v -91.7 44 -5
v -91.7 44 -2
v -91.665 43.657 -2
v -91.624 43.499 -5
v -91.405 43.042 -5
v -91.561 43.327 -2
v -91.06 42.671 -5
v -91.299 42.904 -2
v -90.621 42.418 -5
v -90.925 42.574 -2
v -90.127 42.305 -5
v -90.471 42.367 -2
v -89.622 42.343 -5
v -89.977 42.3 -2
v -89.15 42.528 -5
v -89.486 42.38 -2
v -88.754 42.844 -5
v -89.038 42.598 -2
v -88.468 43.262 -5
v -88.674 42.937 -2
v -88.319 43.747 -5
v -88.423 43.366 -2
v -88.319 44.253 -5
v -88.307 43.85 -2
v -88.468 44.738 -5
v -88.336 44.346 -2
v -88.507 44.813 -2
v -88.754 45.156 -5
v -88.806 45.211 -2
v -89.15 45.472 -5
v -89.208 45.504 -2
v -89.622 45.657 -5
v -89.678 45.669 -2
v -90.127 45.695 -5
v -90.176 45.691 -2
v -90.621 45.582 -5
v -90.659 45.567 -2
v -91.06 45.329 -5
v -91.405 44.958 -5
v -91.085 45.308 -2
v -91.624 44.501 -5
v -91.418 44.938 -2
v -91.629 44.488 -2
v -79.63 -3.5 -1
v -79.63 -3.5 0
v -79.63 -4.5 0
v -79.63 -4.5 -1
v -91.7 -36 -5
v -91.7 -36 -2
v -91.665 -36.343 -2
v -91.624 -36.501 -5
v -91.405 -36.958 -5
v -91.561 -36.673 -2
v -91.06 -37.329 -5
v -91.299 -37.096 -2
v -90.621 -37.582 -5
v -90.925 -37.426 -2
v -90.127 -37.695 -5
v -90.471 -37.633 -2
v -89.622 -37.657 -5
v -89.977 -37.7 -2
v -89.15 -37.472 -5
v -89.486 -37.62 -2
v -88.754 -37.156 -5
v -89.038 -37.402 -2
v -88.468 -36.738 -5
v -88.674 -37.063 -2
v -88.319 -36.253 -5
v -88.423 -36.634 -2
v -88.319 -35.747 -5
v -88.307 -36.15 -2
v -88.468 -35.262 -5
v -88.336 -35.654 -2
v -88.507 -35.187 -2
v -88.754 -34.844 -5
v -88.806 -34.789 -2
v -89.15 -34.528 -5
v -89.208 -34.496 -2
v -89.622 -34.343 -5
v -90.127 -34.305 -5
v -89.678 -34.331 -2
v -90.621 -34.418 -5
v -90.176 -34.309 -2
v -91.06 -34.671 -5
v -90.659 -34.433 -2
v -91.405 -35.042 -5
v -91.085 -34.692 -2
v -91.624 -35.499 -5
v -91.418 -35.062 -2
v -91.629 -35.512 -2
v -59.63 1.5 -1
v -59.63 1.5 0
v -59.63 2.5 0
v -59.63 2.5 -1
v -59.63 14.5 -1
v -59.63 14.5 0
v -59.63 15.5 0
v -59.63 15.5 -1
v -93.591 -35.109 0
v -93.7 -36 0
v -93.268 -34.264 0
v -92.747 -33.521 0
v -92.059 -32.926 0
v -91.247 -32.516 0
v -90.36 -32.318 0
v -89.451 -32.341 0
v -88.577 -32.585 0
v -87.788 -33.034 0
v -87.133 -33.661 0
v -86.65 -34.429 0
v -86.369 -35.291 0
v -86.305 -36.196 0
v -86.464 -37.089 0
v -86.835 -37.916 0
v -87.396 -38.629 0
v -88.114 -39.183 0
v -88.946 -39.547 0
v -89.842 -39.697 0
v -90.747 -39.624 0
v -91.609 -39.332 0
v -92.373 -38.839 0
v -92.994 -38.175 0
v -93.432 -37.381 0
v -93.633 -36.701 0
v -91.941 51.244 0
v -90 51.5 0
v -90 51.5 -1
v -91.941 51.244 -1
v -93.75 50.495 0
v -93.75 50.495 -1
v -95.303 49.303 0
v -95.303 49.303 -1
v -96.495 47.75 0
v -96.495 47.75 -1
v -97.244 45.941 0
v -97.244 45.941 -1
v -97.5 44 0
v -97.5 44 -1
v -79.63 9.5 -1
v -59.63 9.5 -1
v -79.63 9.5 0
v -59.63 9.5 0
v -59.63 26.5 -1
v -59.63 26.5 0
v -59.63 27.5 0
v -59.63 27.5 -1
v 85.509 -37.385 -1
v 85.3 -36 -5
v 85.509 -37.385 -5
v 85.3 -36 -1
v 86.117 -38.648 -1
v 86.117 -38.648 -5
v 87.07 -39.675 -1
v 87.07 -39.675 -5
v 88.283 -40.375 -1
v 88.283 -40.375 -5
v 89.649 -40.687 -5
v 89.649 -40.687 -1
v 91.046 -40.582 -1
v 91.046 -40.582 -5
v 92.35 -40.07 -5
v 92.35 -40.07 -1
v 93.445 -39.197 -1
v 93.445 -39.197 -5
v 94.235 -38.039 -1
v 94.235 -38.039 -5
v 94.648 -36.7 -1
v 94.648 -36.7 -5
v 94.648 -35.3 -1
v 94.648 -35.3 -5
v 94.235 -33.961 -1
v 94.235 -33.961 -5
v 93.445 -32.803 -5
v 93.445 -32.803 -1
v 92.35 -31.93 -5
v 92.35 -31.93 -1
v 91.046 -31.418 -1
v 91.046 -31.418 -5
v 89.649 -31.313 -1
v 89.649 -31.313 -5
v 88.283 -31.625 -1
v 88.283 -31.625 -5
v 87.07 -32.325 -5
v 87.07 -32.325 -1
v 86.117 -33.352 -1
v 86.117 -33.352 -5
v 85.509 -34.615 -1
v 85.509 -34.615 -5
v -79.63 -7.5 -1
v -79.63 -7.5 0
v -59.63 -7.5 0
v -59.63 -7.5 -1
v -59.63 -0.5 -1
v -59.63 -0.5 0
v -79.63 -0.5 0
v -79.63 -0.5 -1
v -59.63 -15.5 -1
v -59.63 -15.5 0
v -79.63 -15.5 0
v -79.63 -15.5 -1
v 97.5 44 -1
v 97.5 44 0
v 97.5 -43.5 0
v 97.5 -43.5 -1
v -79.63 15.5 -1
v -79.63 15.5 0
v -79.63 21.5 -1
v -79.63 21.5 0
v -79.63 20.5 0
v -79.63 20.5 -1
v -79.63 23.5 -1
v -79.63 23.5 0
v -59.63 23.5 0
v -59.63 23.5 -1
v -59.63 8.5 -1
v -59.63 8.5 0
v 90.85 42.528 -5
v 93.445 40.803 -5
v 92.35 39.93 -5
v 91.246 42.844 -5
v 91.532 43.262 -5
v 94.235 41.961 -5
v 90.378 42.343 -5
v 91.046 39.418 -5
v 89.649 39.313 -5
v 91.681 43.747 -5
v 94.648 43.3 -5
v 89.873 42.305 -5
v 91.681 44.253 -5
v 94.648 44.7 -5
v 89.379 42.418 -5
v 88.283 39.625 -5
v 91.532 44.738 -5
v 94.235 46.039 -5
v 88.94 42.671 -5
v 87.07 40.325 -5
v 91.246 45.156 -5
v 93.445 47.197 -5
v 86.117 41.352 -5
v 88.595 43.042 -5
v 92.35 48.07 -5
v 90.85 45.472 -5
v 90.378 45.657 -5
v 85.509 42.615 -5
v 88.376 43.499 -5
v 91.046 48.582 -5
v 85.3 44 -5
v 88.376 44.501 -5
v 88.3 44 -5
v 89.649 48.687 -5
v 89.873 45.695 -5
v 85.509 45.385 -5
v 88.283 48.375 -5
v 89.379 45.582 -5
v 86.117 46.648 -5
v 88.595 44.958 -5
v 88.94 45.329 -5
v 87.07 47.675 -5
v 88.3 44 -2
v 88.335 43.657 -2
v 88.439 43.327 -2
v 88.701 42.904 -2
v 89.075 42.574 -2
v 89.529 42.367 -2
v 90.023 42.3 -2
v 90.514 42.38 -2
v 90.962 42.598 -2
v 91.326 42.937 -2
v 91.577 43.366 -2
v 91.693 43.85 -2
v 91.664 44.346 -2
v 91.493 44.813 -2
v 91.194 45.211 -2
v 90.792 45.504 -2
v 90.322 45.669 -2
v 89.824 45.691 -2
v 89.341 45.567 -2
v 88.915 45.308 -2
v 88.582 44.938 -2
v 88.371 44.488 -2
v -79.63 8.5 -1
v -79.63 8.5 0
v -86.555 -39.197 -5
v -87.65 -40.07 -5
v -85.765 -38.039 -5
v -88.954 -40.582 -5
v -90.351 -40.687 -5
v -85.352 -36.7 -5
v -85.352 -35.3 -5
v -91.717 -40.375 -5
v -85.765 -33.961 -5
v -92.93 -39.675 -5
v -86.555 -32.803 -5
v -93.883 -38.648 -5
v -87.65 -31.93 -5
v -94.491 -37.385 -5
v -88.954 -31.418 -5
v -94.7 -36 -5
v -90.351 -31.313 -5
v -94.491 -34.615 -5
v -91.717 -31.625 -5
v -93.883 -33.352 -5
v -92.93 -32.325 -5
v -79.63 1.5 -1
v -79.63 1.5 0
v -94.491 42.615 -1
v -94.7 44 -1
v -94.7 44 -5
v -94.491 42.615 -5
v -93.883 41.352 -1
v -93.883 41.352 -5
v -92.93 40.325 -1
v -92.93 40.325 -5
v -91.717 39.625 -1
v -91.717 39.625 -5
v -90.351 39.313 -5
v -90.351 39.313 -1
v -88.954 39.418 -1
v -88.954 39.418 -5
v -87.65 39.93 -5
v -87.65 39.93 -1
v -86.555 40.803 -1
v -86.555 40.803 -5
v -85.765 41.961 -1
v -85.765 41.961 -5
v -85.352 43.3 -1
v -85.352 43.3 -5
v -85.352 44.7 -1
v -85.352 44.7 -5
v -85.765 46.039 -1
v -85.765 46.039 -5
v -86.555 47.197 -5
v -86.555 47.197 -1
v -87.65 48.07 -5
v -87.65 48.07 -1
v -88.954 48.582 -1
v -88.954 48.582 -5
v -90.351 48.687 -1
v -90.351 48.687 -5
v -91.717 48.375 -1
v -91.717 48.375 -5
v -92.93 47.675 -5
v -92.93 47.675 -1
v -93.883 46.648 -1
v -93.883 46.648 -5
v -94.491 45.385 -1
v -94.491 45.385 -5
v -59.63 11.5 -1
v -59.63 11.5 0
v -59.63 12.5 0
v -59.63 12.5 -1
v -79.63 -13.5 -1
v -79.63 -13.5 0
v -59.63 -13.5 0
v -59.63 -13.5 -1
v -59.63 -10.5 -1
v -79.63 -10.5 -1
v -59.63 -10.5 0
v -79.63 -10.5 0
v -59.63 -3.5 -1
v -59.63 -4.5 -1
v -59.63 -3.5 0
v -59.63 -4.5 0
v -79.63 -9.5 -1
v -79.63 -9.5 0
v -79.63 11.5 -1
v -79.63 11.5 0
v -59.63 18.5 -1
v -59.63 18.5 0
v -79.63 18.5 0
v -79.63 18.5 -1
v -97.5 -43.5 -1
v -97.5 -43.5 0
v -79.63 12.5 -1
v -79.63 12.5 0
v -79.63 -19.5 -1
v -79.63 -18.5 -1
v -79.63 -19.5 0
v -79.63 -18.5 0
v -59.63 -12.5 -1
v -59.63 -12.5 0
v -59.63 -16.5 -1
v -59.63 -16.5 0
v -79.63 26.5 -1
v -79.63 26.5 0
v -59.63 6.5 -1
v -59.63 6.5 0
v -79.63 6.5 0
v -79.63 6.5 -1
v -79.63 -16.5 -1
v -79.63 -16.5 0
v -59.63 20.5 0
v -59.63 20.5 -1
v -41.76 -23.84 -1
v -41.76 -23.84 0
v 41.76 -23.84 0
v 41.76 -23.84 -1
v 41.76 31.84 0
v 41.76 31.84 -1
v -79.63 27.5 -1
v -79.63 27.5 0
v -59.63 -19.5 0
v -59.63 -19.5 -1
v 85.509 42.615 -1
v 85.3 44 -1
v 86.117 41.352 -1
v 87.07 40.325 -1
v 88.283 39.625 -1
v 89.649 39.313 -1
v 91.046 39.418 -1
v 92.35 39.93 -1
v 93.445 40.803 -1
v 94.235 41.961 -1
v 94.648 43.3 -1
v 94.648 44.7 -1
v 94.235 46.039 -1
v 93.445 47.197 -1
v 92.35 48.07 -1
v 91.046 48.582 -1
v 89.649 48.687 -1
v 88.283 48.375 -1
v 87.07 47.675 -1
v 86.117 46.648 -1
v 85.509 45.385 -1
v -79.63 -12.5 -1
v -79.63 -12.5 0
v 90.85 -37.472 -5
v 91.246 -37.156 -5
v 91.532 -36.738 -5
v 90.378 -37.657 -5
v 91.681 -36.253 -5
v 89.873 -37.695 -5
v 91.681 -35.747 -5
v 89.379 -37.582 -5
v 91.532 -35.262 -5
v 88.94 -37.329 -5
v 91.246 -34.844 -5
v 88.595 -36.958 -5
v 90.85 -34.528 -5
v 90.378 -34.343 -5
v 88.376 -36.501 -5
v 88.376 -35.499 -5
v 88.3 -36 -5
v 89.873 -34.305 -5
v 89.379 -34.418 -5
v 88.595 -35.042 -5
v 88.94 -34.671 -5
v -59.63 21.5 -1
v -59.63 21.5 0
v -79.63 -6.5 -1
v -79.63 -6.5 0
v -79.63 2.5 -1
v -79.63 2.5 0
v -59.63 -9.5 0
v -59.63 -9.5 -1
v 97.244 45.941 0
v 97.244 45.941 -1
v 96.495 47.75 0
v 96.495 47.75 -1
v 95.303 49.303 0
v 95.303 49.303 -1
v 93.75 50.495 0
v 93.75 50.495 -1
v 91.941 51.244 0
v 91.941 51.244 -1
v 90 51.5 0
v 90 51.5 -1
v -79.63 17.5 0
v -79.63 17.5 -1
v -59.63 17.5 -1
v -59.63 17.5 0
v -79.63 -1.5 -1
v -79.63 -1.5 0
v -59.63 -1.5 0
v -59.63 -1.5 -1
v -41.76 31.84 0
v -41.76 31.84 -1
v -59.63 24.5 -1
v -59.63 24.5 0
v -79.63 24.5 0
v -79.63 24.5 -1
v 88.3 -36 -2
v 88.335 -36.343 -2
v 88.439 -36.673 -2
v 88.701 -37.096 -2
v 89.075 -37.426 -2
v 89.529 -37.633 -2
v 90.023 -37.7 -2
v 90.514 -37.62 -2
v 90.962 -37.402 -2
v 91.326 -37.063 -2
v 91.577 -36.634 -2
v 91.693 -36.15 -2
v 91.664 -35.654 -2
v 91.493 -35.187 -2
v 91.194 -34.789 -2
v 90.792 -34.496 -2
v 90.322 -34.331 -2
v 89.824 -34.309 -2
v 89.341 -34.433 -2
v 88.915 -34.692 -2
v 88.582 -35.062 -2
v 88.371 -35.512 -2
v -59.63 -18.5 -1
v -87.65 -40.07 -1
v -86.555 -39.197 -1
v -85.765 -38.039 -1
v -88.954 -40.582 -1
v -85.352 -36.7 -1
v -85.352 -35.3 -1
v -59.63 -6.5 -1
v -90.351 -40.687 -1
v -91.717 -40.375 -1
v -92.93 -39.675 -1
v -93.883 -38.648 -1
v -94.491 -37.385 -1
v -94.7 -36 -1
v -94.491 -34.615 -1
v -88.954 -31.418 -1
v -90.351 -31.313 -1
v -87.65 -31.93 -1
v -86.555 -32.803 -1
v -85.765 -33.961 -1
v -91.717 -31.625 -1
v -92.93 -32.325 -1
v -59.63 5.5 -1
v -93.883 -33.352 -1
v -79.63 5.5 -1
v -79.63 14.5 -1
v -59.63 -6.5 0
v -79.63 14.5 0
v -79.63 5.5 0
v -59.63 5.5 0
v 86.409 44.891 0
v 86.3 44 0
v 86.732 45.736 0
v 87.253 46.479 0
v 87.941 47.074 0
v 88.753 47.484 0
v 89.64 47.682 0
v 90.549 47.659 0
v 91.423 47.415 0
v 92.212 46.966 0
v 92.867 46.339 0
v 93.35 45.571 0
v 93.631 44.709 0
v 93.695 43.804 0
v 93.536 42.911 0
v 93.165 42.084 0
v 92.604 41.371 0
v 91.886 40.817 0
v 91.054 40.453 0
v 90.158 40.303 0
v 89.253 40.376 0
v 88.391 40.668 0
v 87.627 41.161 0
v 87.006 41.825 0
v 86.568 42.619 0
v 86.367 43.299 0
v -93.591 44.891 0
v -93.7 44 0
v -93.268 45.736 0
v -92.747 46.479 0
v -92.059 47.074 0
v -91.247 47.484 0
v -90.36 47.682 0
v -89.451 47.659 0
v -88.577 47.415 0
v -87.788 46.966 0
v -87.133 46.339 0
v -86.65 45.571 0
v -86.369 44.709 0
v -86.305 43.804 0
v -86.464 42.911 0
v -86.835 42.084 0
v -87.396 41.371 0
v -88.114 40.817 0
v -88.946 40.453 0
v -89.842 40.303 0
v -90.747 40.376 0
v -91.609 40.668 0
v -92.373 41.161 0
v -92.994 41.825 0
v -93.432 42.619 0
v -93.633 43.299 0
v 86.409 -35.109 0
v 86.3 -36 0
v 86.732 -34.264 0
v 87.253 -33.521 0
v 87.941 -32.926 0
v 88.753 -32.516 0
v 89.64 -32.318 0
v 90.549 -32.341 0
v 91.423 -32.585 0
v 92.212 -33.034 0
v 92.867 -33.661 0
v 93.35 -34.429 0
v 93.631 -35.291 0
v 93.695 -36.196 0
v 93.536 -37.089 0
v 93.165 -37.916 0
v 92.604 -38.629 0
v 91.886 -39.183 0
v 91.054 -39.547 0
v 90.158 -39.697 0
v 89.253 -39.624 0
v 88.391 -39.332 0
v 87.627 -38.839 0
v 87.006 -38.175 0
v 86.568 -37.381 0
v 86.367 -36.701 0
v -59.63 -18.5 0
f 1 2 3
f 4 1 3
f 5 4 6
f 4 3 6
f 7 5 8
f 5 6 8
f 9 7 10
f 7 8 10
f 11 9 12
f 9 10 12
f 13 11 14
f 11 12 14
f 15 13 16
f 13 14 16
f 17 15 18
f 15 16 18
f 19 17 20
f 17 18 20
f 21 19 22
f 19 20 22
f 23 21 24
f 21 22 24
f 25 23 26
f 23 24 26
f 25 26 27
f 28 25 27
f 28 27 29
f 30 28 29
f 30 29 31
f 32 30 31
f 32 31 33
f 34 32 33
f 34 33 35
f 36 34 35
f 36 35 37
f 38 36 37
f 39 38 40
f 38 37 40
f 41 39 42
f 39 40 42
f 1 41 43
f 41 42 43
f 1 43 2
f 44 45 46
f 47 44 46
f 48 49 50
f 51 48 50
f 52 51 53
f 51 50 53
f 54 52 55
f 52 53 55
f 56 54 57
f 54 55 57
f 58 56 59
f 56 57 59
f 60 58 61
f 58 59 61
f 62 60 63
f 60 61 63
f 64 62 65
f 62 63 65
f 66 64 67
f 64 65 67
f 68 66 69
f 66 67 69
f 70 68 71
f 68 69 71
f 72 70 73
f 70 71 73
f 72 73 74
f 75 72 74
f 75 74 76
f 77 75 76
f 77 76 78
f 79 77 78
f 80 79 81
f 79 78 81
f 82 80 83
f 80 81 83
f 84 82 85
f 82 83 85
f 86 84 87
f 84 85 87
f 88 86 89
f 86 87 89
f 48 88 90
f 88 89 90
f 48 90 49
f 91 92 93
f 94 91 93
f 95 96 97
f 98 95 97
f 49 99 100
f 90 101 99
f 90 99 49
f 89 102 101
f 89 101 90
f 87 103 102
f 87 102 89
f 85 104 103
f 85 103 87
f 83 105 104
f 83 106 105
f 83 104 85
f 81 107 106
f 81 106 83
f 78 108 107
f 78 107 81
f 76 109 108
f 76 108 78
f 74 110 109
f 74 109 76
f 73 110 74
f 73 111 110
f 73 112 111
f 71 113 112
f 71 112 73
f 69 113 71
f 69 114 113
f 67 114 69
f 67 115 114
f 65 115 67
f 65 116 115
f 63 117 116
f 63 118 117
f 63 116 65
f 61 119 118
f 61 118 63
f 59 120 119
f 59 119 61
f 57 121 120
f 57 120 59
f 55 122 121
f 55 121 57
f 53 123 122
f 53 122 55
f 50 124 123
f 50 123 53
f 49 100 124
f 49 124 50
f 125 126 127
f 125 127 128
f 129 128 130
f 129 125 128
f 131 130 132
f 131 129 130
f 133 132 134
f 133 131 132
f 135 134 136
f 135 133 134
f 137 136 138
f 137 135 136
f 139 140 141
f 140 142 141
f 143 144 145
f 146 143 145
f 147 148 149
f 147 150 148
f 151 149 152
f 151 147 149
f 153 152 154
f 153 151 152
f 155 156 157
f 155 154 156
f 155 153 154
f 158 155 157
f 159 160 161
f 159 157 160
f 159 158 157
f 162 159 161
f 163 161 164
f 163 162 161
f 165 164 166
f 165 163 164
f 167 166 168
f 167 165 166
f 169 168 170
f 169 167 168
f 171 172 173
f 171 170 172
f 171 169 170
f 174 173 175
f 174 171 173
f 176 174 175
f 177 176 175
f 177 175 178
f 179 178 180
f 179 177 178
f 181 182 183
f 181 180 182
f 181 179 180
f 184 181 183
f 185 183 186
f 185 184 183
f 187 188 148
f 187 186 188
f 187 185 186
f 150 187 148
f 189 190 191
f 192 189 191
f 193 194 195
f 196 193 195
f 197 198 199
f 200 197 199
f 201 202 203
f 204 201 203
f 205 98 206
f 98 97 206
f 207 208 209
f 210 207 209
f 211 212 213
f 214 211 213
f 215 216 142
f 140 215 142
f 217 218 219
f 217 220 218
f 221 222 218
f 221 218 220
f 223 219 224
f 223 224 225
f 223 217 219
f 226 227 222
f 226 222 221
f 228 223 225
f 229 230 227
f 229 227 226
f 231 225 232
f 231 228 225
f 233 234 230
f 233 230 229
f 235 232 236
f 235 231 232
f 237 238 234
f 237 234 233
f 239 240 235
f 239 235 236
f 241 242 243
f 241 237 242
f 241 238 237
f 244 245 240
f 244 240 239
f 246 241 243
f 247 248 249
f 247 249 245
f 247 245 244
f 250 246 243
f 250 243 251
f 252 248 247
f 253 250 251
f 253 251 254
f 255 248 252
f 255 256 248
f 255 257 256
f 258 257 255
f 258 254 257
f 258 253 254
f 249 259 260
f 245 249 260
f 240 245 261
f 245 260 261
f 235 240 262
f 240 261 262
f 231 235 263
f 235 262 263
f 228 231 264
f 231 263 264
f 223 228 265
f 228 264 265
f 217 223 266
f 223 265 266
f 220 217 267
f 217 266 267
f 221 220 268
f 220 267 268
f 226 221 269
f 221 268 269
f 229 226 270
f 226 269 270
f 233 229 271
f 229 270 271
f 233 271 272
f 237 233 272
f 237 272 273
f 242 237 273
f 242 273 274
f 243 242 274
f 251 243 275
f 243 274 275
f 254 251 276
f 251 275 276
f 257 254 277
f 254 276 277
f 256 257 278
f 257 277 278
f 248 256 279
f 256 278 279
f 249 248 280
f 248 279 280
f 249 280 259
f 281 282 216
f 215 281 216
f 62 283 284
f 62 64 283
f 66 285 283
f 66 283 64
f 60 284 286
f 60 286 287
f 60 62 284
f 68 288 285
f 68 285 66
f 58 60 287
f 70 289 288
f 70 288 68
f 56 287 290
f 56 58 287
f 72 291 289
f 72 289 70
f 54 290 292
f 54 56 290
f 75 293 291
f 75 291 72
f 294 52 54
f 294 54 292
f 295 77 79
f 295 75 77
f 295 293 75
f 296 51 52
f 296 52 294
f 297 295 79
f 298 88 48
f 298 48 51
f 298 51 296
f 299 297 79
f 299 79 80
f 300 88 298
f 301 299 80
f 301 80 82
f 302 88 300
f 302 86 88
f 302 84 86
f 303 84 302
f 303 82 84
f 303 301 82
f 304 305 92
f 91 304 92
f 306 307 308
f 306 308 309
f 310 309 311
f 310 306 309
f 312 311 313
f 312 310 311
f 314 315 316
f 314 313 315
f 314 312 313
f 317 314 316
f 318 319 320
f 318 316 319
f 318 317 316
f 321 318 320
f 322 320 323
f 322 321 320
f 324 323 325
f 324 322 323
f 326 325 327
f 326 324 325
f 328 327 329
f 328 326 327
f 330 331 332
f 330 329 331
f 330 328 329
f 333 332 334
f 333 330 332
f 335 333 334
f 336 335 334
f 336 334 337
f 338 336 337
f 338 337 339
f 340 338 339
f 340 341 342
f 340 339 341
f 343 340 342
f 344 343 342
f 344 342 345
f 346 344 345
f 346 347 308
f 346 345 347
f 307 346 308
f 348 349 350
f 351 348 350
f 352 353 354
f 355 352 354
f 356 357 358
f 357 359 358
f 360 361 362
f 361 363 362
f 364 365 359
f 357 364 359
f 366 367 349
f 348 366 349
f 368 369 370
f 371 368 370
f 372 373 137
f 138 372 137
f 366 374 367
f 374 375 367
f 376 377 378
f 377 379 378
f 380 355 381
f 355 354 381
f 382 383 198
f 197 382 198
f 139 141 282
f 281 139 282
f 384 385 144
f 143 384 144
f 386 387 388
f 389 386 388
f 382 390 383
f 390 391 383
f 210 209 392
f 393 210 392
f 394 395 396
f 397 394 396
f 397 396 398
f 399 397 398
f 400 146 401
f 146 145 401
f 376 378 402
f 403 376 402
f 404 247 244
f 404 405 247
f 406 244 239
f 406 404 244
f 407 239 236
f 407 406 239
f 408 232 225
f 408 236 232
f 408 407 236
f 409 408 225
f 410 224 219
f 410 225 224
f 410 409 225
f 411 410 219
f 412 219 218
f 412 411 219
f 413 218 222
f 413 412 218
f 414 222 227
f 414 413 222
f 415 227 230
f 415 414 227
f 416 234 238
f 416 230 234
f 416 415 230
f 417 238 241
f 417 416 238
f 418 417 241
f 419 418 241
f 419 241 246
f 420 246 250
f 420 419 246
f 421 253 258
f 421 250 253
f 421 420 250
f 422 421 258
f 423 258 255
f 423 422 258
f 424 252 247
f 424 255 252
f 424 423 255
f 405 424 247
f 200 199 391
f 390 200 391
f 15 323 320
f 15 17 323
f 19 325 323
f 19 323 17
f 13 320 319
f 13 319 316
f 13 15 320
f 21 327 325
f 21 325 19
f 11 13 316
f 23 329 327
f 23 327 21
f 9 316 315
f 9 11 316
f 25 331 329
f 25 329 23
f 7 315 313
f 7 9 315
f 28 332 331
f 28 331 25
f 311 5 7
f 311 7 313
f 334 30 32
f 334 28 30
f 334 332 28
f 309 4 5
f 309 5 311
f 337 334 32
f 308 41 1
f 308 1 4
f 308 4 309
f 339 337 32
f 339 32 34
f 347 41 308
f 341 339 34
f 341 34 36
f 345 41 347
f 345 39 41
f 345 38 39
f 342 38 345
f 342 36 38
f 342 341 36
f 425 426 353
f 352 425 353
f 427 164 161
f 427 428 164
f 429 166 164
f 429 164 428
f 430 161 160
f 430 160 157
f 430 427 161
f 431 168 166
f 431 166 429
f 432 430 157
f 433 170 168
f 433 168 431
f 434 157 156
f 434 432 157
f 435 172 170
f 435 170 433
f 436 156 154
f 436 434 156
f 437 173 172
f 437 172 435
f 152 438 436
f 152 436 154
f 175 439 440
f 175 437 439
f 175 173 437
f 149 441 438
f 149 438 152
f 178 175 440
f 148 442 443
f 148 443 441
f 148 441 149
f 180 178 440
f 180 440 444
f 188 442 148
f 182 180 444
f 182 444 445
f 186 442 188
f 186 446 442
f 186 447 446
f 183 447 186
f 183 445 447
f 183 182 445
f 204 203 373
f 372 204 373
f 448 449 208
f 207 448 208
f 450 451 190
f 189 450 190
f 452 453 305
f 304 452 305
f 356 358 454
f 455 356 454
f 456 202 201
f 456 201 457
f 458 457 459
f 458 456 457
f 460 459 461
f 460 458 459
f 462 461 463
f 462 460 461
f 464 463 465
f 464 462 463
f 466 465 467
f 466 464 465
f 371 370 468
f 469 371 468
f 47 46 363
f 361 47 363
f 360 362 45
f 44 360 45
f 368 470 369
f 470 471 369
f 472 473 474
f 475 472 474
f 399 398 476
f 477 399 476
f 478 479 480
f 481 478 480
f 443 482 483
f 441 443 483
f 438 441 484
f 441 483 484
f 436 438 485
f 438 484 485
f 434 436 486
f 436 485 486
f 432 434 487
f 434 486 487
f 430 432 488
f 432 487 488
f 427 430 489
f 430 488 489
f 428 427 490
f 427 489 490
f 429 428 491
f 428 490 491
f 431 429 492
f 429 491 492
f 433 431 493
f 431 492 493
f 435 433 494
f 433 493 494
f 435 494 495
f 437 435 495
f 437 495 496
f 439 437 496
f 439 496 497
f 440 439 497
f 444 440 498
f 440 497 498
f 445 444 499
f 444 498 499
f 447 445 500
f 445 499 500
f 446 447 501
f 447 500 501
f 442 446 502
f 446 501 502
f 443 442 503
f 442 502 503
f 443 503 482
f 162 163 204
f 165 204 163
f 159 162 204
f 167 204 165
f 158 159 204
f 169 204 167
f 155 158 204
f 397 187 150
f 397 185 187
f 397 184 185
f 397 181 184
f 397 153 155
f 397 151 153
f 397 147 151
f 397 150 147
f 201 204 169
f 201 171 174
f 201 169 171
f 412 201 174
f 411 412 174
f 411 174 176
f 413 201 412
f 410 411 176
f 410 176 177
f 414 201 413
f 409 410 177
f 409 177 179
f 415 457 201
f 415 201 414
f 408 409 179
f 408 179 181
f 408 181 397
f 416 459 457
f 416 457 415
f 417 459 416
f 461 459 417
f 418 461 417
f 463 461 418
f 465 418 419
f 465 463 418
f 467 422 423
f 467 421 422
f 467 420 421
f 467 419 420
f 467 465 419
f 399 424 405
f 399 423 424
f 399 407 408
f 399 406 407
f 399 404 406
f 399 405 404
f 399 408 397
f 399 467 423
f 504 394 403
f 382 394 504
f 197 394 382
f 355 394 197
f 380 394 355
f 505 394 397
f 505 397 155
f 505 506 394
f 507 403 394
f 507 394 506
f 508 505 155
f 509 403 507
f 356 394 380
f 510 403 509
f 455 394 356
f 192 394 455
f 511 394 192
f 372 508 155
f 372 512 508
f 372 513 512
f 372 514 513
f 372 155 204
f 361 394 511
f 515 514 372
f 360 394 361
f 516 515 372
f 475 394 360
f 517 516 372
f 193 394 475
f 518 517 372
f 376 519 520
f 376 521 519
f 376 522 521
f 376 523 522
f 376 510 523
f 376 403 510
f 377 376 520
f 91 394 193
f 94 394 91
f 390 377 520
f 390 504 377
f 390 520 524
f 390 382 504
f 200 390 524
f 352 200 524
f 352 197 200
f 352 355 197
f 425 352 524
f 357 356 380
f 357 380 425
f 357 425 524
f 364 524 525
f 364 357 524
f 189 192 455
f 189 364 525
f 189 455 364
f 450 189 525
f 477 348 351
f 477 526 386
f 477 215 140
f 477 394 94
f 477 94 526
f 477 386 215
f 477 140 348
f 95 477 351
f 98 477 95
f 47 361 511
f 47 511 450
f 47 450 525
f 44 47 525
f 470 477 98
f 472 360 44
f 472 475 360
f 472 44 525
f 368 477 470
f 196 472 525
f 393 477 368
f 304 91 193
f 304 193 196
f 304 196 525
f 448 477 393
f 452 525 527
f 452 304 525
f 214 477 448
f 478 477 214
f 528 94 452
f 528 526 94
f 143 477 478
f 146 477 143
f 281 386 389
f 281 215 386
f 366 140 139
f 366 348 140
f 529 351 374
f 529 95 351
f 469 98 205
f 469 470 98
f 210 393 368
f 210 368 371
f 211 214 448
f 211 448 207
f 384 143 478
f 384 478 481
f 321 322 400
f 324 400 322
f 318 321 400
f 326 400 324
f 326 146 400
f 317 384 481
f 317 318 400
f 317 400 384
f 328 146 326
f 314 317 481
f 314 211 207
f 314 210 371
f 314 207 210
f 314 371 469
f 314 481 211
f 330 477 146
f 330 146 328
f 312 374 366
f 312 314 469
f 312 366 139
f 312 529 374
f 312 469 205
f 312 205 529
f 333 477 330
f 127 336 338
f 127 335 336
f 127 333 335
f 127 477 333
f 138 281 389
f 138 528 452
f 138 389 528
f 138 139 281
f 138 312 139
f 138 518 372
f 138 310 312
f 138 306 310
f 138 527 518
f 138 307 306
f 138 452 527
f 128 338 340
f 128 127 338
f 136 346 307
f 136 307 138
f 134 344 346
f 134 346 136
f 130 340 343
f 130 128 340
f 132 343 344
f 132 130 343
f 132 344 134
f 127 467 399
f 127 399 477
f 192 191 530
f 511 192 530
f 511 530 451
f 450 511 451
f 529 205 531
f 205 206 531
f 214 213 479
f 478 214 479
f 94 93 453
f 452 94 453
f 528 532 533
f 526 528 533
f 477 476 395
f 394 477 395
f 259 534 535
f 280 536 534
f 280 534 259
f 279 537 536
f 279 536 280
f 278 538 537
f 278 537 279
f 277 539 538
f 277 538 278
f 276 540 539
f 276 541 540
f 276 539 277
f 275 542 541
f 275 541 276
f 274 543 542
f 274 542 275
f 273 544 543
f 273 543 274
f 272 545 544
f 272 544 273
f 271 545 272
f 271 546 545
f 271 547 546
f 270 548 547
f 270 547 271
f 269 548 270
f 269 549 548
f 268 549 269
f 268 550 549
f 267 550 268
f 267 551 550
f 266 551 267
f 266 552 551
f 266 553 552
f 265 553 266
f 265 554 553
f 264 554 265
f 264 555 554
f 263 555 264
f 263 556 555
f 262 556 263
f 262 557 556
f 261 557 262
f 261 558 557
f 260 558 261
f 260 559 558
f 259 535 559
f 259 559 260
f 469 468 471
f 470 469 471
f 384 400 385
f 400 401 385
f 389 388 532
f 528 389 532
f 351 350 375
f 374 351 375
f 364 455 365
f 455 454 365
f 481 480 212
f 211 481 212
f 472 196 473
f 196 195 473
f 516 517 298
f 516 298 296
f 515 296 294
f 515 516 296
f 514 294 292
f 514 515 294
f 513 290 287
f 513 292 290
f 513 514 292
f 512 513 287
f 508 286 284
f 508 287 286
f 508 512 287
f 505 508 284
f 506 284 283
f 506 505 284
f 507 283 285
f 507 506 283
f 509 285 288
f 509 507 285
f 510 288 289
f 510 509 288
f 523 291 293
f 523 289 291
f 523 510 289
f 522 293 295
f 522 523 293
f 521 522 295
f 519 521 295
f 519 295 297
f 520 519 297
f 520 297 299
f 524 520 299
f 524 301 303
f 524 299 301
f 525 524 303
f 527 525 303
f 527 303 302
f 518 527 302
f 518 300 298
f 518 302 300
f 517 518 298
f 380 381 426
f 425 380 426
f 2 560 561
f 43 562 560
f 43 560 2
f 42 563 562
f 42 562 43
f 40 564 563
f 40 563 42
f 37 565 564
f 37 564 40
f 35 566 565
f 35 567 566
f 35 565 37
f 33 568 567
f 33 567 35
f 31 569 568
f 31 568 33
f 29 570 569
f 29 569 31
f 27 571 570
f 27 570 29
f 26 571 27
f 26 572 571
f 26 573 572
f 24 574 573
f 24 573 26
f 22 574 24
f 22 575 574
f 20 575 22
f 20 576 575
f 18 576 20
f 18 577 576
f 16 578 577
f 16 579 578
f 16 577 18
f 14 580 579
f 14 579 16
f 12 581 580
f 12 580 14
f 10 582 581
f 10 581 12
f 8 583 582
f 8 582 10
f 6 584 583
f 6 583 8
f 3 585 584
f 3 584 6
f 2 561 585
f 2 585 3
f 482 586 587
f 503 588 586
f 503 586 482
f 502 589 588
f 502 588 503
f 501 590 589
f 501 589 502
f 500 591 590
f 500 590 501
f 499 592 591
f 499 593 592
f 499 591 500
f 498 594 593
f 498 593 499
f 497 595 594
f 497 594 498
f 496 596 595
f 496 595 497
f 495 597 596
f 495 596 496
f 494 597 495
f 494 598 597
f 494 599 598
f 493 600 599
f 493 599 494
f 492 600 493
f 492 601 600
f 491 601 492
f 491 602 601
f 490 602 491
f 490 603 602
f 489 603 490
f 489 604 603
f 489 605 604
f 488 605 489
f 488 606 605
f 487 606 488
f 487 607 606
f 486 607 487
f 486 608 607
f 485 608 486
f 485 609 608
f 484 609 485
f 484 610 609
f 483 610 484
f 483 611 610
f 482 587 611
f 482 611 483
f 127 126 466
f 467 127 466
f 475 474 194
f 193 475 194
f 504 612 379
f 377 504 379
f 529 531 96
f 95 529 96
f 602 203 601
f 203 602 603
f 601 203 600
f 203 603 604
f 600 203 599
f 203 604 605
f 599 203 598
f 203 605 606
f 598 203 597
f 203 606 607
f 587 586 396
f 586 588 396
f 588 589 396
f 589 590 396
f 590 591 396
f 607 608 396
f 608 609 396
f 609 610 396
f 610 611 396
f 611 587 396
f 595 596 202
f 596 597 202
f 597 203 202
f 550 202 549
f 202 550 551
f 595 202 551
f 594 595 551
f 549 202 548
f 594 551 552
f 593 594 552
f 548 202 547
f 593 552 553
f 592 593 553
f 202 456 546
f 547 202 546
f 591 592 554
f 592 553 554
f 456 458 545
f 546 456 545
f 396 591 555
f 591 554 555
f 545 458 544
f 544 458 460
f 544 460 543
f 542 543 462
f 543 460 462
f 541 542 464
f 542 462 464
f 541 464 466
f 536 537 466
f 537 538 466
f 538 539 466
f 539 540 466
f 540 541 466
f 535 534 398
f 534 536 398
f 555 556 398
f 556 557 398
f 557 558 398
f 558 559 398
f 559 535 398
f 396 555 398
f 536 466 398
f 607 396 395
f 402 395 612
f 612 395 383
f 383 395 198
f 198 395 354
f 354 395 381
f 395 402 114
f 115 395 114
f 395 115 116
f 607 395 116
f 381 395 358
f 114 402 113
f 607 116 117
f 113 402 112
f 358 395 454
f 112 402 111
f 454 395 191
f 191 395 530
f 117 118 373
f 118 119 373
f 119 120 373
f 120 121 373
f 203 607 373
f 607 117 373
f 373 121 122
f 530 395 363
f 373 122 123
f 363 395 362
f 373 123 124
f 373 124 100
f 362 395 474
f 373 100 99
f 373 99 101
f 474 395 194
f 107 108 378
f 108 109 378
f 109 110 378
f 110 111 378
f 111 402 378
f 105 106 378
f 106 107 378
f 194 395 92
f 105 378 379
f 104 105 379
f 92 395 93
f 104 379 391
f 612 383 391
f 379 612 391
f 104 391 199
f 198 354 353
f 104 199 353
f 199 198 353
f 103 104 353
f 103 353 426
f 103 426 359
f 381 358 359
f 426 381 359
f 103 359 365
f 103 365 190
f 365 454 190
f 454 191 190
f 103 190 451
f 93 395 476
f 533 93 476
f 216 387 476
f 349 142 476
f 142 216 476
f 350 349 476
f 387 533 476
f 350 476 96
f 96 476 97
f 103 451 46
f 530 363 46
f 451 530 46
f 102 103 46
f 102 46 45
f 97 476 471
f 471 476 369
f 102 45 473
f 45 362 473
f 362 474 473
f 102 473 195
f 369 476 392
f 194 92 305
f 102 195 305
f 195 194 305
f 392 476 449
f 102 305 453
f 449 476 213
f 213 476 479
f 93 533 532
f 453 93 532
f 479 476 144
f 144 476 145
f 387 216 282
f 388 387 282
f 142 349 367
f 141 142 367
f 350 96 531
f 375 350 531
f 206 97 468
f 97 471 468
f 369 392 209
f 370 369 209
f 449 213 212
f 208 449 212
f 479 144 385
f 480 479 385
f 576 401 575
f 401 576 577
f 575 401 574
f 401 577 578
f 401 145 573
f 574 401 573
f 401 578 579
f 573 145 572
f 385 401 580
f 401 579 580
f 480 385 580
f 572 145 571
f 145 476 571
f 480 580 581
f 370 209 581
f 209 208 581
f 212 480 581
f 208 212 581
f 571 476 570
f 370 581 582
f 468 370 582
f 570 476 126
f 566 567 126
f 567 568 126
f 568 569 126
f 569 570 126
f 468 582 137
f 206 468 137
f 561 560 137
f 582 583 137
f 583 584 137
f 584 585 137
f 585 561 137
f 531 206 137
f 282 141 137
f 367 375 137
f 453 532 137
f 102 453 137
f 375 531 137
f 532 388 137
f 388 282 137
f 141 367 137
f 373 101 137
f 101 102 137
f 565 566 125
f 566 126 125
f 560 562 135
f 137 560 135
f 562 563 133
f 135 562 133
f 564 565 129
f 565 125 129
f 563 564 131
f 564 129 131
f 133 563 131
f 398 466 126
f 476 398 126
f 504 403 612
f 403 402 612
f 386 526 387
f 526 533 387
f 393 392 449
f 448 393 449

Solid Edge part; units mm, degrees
sketch "Sketch1" plane through (0, 0, 0) normal (0, 0, 1) x (1, 0, 0)
  line L0 (-97.5, -43.5) -> (-97.5, 44)
  arc A0 (-97.5, 44) -> (-90, 51.5) centre (-90, 44) cw
  line L1 (-90, 51.5) -> (90, 51.5)
  arc A1 (90, 51.5) -> (97.5, 44) centre (90, 44) cw
  line L2 (97.5, 44) -> (97.5, -43.5)
  line L3 (97.5, -43.5) -> (-97.5, -43.5)
extrude "Protrusion1" add sketch "Sketch1" against normal blind 1
sketch "Sketch2" plane through (0, 4, 0) normal (0, 0, 1) x (1, 0, 0)
  line L0 (41.76, -27.84) -> (41.76, 27.84)
  line L1 (41.76, 27.84) -> (-41.76, 27.84)
  line L2 (-41.76, 27.84) -> (-41.76, -27.84)
  line L3 (-41.76, -27.84) -> (41.76, -27.84)
extrude "Cutout1" cut sketch "Sketch2" against normal up to vertex (1 mm away)
sketch "Sketch3" plane through (0, 4, -1) normal (0, 0, -1) x (-1, 0, 0)
  circle A0 centre (90, 40) radius 4.7
  circle A1 centre (90, 40) radius 1.7
  circle A2 centre (-90, 40) radius 4.7
  circle A3 centre (-90, 40) radius 1.7
  circle A4 centre (-90, -40) radius 4.7
  circle A5 centre (-90, -40) radius 1.7
  circle A6 centre (90, -40) radius 4.7
  circle A7 centre (90, -40) radius 1.7
  dimension "D1" = 3.4
  dimension "D2" = 80
  dimension "D3" = 3
  dimension "D4" = 3
  dimension "D5" = 3
  dimension "D6" = 3
extrude "ExtrudedProtrusion_2" add sketch "Sketch3" along normal blind 4
sketch "Sketch4" plane through (0, 4, -1) normal (0, 0, -1) x (-1, 0, 0)
  circle A0 centre (-90, 40) radius 1.7
  circle A1 centre (-90, -40) radius 1.7
  circle A2 centre (90, -40) radius 1.7
  circle A3 centre (90, 40) radius 1.7
  dimension "D1" = 3.4
  dimension "D2" = 80
  dimension "D3" = 3
  dimension "D4" = 3
  dimension "D5" = 3
  dimension "D6" = 3
extrude "Cutout2" cut sketch "Sketch4" against normal up to vertex (1 mm away)
chamfer "Chamfer_1" distance 2 angle 45 4 edges at (-88.3, 44, 0) (91.7, 44, 0) (91.7, -36, 0) (-88.3, -36, 0)
sketch "Sketch5" plane through (0, 4, 0) normal (0, 0, 1) x (1, 0, 0)
  line L0 (-59.63, 23.5) -> (-79.63, 23.5)
  line L1 (-79.63, 23.5) -> (-79.63, 22.5)
  line L2 (-79.63, 22.5) -> (-59.63, 22.5)
  line L3 (-59.63, 22.5) -> (-59.63, 23.5)
  line L4 (-79.63, 19.5) -> (-59.63, 19.5)
  line L5 (-59.63, 19.5) -> (-59.63, 20.5)
  line L6 (-59.63, 20.5) -> (-79.63, 20.5)
  line L7 (-79.63, 20.5) -> (-79.63, 19.5)
  line L8 (-79.63, 16.5) -> (-59.63, 16.5)
  line L9 (-59.63, 16.5) -> (-59.63, 17.5)
  line L10 (-59.63, 17.5) -> (-79.63, 17.5)
  line L11 (-79.63, 17.5) -> (-79.63, 16.5)
  line L12 (-59.63, 11.5) -> (-79.63, 11.5)
  line L13 (-79.63, 11.5) -> (-79.63, 10.5)
  line L14 (-79.63, 10.5) -> (-59.63, 10.5)
  line L15 (-59.63, 10.5) -> (-59.63, 11.5)
  line L16 (-79.63, 13.5) -> (-59.63, 13.5)
  line L17 (-59.63, 13.5) -> (-59.63, 14.5)
  line L18 (-59.63, 14.5) -> (-79.63, 14.5)
  line L19 (-79.63, 14.5) -> (-79.63, 13.5)
  line L20 (-79.63, 7.5) -> (-59.63, 7.5)
  line L21 (-59.63, 7.5) -> (-59.63, 8.5)
  line L22 (-59.63, 8.5) -> (-79.63, 8.5)
  line L23 (-79.63, 8.5) -> (-79.63, 7.5)
  line L24 (-59.63, 5.5) -> (-79.63, 5.5)
  line L25 (-79.63, 5.5) -> (-79.63, 4.5)
  line L26 (-79.63, 4.5) -> (-59.63, 4.5)
  line L27 (-59.63, 4.5) -> (-59.63, 5.5)
  line L28 (-79.63, 1.5) -> (-59.63, 1.5)
  line L29 (-59.63, 1.5) -> (-59.63, 2.5)
  line L30 (-59.63, 2.5) -> (-79.63, 2.5)
  line L31 (-79.63, 2.5) -> (-79.63, 1.5)
  line L32 (-79.63, -2.5) -> (-59.63, -2.5)
  line L33 (-59.63, -2.5) -> (-59.63, -1.5)
  line L34 (-59.63, -1.5) -> (-79.63, -1.5)
  line L35 (-79.63, -1.5) -> (-79.63, -2.5)
  line L36 (-79.63, -5.5) -> (-59.63, -5.5)
  line L37 (-59.63, -5.5) -> (-59.63, -4.5)
  line L38 (-59.63, -4.5) -> (-79.63, -4.5)
  line L39 (-79.63, -4.5) -> (-79.63, -5.5)
  line L40 (-79.63, -8.5) -> (-59.63, -8.5)
  line L41 (-59.63, -8.5) -> (-59.63, -7.5)
  line L42 (-59.63, -7.5) -> (-79.63, -7.5)
  line L43 (-79.63, -7.5) -> (-79.63, -8.5)
  line L44 (-79.63, -11.5) -> (-59.63, -11.5)
  line L45 (-59.63, -11.5) -> (-59.63, -10.5)
  line L46 (-59.63, -10.5) -> (-79.63, -10.5)
  line L47 (-79.63, -10.5) -> (-79.63, -11.5)
  line L48 (-79.63, -14.5) -> (-59.63, -14.5)
  line L49 (-59.63, -14.5) -> (-59.63, -13.5)
  line L50 (-59.63, -13.5) -> (-79.63, -13.5)
  line L51 (-79.63, -13.5) -> (-79.63, -14.5)
  line L52 (-59.63, -16.5) -> (-79.63, -16.5)
  line L53 (-79.63, -16.5) -> (-79.63, -17.5)
  line L54 (-79.63, -17.5) -> (-59.63, -17.5)
  line L55 (-59.63, -17.5) -> (-59.63, -16.5)
  line L56 (-79.63, -20.5) -> (-59.63, -20.5)
  line L57 (-59.63, -20.5) -> (-59.63, -19.5)
  line L58 (-59.63, -19.5) -> (-79.63, -19.5)
  line L59 (-79.63, -19.5) -> (-79.63, -20.5)
  line L60 (-59.63, -22.5) -> (-79.63, -22.5)
  line L61 (-79.63, -22.5) -> (-79.63, -23.5)
  line L62 (-79.63, -23.5) -> (-59.63, -23.5)
  line L63 (-59.63, -23.5) -> (-59.63, -22.5)
  dimension "D1" = 1
  dimension "D2" = 20
  dimension "D3" = 2
  dimension "D4" = 27.87
  dimension "D5" = 1
  dimension "D6" = 20
  dimension "D7" = 2
  dimension "D8" = 24
  dimension "D9" = 24
extrude "Cutout3" cut sketch "Sketch5" against normal up to vertex (1 mm away)
properties material "Polycarbonate"
